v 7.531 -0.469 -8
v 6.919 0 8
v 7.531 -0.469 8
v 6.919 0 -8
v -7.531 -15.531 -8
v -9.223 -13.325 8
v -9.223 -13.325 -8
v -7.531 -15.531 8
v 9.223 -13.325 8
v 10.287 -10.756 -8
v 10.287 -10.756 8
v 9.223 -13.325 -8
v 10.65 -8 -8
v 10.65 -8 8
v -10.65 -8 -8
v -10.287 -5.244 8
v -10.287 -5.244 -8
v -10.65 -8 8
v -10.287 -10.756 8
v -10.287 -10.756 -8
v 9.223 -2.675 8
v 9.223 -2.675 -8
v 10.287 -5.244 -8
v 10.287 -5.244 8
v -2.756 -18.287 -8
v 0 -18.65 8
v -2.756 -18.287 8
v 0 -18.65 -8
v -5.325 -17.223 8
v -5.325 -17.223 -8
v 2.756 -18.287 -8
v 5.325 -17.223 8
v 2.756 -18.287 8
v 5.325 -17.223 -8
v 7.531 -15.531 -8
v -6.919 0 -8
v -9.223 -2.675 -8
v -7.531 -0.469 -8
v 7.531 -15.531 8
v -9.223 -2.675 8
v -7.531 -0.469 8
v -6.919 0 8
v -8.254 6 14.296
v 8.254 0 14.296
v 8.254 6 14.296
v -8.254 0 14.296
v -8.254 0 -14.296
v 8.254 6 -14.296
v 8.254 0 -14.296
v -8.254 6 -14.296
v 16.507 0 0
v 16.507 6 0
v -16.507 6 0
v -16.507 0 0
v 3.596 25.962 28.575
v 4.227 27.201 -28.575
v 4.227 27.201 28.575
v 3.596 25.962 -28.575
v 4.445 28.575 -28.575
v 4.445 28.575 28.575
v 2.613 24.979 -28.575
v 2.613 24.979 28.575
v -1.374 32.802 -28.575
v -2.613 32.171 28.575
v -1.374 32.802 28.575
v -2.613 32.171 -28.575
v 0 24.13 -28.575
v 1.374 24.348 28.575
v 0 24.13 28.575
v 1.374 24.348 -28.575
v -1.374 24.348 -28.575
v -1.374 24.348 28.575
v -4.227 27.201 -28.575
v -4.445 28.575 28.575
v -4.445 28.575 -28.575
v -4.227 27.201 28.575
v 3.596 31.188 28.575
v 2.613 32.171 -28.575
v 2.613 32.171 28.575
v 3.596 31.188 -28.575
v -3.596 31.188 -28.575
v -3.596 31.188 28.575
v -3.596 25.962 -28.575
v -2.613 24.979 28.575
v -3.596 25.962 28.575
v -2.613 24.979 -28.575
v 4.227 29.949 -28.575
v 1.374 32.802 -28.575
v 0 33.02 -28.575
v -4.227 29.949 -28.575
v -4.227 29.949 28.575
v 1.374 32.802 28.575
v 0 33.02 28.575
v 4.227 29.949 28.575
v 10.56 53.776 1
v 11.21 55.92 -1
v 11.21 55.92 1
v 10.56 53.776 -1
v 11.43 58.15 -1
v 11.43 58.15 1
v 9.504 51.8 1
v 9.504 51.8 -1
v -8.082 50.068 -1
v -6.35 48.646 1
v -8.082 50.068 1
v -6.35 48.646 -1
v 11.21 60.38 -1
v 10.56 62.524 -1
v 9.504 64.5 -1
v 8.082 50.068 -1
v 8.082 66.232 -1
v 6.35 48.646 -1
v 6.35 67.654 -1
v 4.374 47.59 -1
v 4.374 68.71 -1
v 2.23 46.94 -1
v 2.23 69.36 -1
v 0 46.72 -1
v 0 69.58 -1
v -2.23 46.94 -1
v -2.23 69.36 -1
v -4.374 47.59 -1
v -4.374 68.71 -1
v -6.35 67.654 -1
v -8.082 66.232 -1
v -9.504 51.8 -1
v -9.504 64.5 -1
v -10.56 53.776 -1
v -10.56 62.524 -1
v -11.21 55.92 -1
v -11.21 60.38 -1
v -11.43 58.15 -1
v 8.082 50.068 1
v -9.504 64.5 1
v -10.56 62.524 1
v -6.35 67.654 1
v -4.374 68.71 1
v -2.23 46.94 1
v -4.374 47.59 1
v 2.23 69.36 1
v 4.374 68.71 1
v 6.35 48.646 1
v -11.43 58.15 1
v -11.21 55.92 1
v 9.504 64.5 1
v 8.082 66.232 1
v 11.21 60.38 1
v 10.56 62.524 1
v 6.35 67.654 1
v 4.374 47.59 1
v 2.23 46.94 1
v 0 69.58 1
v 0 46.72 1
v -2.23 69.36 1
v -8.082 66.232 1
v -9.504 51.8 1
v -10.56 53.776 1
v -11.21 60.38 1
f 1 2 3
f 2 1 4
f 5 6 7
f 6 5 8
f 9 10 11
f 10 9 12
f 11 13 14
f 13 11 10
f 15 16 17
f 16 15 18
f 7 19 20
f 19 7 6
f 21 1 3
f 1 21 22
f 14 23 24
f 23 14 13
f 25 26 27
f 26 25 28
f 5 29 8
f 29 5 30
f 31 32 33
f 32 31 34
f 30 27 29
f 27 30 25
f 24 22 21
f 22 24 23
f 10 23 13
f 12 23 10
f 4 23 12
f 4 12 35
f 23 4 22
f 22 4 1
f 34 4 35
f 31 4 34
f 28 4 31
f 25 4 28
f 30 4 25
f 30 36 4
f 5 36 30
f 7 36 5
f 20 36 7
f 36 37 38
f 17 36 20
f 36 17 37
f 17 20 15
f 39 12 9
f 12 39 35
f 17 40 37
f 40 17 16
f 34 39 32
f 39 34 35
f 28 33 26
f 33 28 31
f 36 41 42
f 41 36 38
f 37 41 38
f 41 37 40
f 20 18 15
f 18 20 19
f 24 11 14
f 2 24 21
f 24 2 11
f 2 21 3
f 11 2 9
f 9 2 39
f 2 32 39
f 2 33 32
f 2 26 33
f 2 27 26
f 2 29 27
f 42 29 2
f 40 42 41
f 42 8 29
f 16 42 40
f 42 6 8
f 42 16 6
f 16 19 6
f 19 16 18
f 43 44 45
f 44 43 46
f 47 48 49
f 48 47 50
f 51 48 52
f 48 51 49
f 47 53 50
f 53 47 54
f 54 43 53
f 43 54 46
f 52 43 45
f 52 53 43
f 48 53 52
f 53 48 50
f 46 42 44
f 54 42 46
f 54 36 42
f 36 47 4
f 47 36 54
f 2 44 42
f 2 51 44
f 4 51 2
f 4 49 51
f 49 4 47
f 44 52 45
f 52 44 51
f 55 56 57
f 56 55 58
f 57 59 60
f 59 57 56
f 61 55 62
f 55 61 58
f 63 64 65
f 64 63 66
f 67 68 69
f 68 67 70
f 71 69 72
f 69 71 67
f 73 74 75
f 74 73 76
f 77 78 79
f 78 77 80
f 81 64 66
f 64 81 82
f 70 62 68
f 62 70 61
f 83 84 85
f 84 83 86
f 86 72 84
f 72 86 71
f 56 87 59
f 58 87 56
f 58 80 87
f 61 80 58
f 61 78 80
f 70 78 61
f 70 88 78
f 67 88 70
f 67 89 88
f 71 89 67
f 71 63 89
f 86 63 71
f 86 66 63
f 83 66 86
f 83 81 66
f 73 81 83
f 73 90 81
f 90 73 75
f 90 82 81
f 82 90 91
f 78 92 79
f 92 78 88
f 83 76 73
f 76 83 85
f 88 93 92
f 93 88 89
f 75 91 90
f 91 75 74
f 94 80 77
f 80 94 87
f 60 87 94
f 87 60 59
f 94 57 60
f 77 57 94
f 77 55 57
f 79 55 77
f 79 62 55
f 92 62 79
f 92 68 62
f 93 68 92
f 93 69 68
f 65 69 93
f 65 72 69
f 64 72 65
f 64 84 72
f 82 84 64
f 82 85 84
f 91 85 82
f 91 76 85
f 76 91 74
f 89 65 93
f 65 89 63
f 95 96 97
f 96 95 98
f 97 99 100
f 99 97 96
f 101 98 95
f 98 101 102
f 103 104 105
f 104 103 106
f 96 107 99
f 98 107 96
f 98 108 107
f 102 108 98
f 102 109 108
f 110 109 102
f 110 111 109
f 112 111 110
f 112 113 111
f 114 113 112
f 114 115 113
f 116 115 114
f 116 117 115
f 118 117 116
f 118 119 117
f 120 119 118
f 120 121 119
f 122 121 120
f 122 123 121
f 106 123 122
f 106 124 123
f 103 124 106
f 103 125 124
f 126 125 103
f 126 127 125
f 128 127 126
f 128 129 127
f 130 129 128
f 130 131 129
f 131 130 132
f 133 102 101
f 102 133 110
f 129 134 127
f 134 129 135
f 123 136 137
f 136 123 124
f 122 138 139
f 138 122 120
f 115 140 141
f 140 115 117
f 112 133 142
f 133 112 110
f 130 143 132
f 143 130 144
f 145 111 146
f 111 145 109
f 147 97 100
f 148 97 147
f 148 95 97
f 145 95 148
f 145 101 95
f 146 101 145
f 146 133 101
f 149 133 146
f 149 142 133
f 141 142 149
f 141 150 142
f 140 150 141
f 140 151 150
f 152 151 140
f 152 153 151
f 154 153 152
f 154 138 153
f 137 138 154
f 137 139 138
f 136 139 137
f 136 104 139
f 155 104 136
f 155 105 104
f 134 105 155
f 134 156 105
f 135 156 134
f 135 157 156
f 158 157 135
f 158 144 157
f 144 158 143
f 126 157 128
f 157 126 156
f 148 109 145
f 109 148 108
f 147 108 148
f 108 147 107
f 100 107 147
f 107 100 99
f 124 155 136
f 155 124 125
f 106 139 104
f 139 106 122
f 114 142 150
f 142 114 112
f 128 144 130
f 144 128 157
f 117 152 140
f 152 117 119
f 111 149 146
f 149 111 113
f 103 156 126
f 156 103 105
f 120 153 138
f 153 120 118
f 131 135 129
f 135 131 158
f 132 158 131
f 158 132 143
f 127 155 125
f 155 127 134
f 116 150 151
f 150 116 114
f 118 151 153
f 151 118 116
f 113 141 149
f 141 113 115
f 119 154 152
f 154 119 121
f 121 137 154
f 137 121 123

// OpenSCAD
// Auto-generated by scripts/author_from_manifest.py (Phase D.3).
// Source: data/phase_d_manifest.json (sku_intent='viking-vk100-upright-200f').
// Do not hand-edit — regenerate from the manifest.
//
// @part viking_vk100_upright_200f
// @kind sprinkler_head
// @category head.upright.k56
// @display-name "Viking VK100 Upright K5.6 SR 200°F"
// @mfg viking_group
// @mfg-pn VK100
// @listing UL FM
// @hazard-classes LH OH1
// @price-usd 12.90
// @install-minutes 8
// @crew journeyman
// @k-factor 5.6
// @orientation upright
// @response standard
// @temperature 200F
// @param size_in number default=0.5 label="Size" unit="in"
// @port inlet position=[0,0.014,0] direction=[0,1,0] style=NPT_threaded size_in=0.5 role=drop

size_in = 0.5;
k_factor = 5.6;

length_mm   = 57.15;
body_dia_mm = 25.40;
thread_od   = 21.3;
thread_len  = 16;
deflector_d = body_dia_mm * 0.9;

rotate([180,0,0]) union() {
    translate([0, thread_len/2, 0])
        cylinder(h = thread_len, d = thread_od, center = true, $fn = 24);
    translate([0, -3, 0])
        rotate([90, 0, 0])
        cylinder(h = 6, d = thread_od * 1.55, $fn = 6, center = true);
    translate([0, -length_mm/2, 0])
        cylinder(h = length_mm, d = body_dia_mm * 0.35, center = true, $fn = 20);
    translate([0, -length_mm - 1, 0])
        cylinder(h = 2, d = deflector_d, center = true, $fn = 32);
}
